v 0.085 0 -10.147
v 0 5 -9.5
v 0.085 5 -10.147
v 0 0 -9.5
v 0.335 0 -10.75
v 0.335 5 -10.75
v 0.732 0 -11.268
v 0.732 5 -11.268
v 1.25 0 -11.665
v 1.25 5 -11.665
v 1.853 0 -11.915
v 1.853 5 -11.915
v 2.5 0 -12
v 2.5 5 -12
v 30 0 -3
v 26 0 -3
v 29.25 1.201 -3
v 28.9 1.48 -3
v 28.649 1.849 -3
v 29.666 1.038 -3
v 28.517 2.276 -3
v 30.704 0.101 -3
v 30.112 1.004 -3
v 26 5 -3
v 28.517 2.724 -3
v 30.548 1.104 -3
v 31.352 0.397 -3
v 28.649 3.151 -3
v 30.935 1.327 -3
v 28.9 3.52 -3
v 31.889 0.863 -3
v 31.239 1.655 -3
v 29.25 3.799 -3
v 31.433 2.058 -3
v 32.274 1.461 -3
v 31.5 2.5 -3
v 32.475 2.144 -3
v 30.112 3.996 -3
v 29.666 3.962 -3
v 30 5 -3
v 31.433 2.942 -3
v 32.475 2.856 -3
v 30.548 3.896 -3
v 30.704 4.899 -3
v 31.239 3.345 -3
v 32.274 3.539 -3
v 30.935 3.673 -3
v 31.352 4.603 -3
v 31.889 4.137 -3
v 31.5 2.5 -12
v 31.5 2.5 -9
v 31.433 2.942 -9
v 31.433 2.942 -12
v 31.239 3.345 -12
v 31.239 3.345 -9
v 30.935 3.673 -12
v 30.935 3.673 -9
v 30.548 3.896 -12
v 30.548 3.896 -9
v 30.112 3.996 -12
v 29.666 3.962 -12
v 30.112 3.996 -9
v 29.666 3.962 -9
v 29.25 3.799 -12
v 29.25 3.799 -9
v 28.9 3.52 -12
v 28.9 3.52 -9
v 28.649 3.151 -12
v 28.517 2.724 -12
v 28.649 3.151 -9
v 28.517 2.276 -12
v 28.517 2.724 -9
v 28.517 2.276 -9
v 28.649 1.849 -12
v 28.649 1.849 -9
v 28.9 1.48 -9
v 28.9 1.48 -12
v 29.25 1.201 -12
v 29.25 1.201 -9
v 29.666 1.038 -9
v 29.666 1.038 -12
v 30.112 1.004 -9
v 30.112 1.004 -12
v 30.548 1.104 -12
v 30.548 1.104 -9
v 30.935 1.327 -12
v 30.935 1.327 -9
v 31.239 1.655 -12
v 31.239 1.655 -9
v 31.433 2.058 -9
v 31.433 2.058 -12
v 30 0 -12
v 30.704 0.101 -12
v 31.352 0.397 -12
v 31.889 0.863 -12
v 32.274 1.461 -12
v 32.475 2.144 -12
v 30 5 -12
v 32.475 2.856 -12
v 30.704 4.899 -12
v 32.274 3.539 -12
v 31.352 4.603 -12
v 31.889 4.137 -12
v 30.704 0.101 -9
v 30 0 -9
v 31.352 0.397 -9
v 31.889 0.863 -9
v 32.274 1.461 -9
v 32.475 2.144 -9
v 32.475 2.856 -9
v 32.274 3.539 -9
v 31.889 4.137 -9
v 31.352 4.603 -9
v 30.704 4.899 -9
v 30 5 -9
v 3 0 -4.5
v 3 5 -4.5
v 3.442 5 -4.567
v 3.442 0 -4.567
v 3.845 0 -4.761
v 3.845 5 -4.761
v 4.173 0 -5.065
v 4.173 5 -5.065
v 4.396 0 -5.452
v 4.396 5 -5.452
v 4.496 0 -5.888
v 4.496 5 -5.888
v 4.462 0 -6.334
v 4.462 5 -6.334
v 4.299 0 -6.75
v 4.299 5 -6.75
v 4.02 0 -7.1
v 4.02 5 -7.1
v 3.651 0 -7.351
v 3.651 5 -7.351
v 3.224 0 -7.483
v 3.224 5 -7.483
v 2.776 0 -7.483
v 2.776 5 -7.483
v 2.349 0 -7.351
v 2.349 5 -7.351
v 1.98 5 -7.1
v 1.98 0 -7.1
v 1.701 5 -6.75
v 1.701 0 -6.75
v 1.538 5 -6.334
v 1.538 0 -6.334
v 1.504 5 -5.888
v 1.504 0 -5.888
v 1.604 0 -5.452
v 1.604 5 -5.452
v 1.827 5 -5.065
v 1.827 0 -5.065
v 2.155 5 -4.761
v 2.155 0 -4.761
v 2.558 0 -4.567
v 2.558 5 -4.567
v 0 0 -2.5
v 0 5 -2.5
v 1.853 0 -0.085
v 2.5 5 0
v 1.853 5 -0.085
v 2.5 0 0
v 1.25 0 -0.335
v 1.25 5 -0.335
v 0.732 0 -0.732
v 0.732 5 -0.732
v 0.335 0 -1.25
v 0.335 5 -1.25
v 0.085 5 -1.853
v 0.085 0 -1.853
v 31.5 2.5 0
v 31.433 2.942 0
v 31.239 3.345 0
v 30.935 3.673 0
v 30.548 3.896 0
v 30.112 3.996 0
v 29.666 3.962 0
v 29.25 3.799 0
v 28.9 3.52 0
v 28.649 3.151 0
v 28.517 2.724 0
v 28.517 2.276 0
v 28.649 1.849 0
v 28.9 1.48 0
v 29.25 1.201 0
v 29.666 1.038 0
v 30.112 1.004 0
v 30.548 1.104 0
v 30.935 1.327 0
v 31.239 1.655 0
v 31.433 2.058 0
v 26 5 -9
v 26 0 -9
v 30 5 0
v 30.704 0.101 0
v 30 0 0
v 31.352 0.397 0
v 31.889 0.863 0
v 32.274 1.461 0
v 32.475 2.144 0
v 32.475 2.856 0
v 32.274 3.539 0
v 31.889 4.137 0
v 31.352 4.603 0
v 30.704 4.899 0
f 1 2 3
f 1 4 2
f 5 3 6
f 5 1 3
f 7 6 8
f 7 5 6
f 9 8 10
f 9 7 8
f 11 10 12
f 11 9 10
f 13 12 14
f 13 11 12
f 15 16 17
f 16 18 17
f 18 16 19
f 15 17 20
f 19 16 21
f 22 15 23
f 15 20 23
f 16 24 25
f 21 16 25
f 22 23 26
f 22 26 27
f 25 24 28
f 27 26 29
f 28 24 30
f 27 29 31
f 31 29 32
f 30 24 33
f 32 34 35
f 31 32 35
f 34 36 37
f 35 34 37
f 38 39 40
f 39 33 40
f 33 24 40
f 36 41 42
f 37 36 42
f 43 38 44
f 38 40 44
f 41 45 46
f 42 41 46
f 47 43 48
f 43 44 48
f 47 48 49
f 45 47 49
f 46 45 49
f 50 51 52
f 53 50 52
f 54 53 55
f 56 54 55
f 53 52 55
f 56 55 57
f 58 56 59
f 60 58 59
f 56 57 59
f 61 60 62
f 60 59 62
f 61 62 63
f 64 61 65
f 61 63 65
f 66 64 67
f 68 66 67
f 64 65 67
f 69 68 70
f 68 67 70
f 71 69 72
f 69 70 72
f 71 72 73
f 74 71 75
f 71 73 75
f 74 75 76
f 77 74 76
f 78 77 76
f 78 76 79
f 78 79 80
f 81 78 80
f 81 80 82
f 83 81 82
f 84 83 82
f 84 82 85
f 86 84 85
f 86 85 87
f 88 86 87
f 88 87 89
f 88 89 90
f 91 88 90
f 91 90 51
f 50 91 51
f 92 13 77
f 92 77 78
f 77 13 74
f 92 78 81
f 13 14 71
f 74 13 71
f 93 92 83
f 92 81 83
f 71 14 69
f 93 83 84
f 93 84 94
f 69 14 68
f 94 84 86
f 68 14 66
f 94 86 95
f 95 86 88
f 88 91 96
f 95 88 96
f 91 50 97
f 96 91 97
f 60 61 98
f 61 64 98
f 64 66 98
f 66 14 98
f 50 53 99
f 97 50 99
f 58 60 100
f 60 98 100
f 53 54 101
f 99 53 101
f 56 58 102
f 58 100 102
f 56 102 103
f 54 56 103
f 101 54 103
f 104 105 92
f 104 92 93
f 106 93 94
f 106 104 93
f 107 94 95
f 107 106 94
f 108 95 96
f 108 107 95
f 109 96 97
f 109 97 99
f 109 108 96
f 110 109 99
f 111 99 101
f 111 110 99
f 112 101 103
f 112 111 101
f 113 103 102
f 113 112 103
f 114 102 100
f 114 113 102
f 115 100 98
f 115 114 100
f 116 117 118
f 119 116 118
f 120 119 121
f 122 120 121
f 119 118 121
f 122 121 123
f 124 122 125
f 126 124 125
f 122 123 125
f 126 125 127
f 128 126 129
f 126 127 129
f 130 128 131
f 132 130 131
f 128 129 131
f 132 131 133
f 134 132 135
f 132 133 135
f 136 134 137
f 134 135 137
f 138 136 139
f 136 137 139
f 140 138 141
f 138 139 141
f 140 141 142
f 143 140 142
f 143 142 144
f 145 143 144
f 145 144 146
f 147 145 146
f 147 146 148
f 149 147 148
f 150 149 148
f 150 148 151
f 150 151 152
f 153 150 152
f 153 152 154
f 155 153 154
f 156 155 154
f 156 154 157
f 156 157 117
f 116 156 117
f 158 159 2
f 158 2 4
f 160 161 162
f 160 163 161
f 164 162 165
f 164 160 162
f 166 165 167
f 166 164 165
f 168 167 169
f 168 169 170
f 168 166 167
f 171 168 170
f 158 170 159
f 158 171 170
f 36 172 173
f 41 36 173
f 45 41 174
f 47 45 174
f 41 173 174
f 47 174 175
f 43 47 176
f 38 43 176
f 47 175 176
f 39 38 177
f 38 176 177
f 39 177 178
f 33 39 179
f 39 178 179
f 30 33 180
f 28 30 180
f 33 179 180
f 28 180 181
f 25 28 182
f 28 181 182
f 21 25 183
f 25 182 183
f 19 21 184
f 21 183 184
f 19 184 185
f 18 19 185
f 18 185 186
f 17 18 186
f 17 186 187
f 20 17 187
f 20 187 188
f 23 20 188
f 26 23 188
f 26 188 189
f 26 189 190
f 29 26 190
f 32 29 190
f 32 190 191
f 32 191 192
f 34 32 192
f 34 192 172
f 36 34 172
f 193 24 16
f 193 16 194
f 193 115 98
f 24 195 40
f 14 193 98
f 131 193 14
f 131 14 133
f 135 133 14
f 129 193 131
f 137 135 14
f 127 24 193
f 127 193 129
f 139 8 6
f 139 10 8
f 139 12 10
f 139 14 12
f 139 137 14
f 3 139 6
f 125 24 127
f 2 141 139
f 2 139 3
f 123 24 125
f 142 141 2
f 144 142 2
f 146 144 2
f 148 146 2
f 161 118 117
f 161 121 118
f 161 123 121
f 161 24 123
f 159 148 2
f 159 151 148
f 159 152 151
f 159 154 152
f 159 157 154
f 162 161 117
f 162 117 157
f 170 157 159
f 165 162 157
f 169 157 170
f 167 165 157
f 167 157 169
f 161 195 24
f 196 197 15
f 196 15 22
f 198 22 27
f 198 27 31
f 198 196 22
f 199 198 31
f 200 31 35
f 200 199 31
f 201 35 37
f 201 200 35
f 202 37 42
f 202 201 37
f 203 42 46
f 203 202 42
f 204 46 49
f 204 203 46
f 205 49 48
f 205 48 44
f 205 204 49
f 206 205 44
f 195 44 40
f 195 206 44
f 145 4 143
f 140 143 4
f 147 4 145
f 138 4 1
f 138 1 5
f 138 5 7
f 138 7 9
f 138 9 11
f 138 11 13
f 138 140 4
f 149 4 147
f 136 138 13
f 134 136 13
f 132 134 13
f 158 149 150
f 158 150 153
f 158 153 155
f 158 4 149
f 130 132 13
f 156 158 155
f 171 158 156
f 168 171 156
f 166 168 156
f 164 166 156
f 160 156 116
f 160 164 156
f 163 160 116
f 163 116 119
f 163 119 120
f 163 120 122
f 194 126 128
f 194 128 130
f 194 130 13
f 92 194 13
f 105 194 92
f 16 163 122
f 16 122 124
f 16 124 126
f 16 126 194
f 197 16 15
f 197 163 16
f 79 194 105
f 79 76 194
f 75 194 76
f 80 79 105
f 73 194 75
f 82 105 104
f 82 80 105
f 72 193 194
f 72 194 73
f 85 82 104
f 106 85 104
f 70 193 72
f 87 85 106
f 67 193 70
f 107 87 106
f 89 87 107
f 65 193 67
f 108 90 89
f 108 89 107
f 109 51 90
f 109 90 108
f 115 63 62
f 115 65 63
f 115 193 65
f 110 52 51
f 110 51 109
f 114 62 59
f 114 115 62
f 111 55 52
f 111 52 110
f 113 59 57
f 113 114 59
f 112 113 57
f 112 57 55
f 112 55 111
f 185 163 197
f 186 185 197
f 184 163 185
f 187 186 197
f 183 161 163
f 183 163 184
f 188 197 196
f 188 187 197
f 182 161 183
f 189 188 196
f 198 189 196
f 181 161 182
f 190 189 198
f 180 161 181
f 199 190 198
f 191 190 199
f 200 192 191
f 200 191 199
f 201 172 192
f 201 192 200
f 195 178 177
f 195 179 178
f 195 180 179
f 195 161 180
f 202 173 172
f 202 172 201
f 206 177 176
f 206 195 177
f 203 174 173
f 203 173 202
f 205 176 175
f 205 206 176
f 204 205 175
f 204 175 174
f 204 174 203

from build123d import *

# Parameters (mm, degrees)
BOSS_EXTRUDE1_DEPTH = 12
SKETCH2_W           = 6.5
SKETCH2_H           = 6
CUT_EXTRUDE1_DEPTH  = 36.003571246
SKETCH3_R           = 1.5
CUT_EXTRUDE2_DEPTH  = 12
SKETCH6_R           = 1.5
CUT_EXTRUDE3_DEPTH  = 36.003571246
FILLET1_R           = 2.5


with BuildPart() as part:
    # Sketch1 → Boss-Extrude1 (new body)
    with BuildSketch(Plane.XY):
        with BuildLine():
            Line((0, 0), (30, 0))
            ThreePointArc((30, 0), (32.5, 2.5), (30, 5))
            Line((30, 5), (0, 5))
            Line((0, 5), (0, 0))
        make_face()
    extrude(amount=-BOSS_EXTRUDE1_DEPTH)

    # Sketch2 → Cut-Extrude1 (cut, through all)
    with BuildSketch(Plane(origin=(0, 5, 0), x_dir=(1, 0, 0), z_dir=(0, 1, 0))):
        with Locations((29.25, 6)):
            Rectangle(SKETCH2_W, SKETCH2_H)
    extrude(amount=-CUT_EXTRUDE1_DEPTH, mode=Mode.SUBTRACT)

    # Sketch3 → Cut-Extrude2 (cut)
    with BuildSketch(Plane.XY):
        with Locations((30, 2.5)):
            Circle(SKETCH3_R)
    extrude(amount=-CUT_EXTRUDE2_DEPTH, mode=Mode.SUBTRACT)

    # Sketch6 → Cut-Extrude3 (cut, through all)
    with BuildSketch(Plane(origin=(0, 5, 0), x_dir=(1, 0, 0), z_dir=(0, 1, 0))):
        with Locations(Location((3, 6, 0), (0, 0, 270))):
            Circle(SKETCH6_R)
    extrude(amount=-CUT_EXTRUDE3_DEPTH, mode=Mode.SUBTRACT)

    # Fillet1
    fillet1_edges = [part.edges().sort_by_distance(p)[0] for p in [
        (0, 2.5, -12),
        (0, 2.5, 0),
    ]]
    fillet(fillet1_edges, radius=FILLET1_R)


solid = part.part
